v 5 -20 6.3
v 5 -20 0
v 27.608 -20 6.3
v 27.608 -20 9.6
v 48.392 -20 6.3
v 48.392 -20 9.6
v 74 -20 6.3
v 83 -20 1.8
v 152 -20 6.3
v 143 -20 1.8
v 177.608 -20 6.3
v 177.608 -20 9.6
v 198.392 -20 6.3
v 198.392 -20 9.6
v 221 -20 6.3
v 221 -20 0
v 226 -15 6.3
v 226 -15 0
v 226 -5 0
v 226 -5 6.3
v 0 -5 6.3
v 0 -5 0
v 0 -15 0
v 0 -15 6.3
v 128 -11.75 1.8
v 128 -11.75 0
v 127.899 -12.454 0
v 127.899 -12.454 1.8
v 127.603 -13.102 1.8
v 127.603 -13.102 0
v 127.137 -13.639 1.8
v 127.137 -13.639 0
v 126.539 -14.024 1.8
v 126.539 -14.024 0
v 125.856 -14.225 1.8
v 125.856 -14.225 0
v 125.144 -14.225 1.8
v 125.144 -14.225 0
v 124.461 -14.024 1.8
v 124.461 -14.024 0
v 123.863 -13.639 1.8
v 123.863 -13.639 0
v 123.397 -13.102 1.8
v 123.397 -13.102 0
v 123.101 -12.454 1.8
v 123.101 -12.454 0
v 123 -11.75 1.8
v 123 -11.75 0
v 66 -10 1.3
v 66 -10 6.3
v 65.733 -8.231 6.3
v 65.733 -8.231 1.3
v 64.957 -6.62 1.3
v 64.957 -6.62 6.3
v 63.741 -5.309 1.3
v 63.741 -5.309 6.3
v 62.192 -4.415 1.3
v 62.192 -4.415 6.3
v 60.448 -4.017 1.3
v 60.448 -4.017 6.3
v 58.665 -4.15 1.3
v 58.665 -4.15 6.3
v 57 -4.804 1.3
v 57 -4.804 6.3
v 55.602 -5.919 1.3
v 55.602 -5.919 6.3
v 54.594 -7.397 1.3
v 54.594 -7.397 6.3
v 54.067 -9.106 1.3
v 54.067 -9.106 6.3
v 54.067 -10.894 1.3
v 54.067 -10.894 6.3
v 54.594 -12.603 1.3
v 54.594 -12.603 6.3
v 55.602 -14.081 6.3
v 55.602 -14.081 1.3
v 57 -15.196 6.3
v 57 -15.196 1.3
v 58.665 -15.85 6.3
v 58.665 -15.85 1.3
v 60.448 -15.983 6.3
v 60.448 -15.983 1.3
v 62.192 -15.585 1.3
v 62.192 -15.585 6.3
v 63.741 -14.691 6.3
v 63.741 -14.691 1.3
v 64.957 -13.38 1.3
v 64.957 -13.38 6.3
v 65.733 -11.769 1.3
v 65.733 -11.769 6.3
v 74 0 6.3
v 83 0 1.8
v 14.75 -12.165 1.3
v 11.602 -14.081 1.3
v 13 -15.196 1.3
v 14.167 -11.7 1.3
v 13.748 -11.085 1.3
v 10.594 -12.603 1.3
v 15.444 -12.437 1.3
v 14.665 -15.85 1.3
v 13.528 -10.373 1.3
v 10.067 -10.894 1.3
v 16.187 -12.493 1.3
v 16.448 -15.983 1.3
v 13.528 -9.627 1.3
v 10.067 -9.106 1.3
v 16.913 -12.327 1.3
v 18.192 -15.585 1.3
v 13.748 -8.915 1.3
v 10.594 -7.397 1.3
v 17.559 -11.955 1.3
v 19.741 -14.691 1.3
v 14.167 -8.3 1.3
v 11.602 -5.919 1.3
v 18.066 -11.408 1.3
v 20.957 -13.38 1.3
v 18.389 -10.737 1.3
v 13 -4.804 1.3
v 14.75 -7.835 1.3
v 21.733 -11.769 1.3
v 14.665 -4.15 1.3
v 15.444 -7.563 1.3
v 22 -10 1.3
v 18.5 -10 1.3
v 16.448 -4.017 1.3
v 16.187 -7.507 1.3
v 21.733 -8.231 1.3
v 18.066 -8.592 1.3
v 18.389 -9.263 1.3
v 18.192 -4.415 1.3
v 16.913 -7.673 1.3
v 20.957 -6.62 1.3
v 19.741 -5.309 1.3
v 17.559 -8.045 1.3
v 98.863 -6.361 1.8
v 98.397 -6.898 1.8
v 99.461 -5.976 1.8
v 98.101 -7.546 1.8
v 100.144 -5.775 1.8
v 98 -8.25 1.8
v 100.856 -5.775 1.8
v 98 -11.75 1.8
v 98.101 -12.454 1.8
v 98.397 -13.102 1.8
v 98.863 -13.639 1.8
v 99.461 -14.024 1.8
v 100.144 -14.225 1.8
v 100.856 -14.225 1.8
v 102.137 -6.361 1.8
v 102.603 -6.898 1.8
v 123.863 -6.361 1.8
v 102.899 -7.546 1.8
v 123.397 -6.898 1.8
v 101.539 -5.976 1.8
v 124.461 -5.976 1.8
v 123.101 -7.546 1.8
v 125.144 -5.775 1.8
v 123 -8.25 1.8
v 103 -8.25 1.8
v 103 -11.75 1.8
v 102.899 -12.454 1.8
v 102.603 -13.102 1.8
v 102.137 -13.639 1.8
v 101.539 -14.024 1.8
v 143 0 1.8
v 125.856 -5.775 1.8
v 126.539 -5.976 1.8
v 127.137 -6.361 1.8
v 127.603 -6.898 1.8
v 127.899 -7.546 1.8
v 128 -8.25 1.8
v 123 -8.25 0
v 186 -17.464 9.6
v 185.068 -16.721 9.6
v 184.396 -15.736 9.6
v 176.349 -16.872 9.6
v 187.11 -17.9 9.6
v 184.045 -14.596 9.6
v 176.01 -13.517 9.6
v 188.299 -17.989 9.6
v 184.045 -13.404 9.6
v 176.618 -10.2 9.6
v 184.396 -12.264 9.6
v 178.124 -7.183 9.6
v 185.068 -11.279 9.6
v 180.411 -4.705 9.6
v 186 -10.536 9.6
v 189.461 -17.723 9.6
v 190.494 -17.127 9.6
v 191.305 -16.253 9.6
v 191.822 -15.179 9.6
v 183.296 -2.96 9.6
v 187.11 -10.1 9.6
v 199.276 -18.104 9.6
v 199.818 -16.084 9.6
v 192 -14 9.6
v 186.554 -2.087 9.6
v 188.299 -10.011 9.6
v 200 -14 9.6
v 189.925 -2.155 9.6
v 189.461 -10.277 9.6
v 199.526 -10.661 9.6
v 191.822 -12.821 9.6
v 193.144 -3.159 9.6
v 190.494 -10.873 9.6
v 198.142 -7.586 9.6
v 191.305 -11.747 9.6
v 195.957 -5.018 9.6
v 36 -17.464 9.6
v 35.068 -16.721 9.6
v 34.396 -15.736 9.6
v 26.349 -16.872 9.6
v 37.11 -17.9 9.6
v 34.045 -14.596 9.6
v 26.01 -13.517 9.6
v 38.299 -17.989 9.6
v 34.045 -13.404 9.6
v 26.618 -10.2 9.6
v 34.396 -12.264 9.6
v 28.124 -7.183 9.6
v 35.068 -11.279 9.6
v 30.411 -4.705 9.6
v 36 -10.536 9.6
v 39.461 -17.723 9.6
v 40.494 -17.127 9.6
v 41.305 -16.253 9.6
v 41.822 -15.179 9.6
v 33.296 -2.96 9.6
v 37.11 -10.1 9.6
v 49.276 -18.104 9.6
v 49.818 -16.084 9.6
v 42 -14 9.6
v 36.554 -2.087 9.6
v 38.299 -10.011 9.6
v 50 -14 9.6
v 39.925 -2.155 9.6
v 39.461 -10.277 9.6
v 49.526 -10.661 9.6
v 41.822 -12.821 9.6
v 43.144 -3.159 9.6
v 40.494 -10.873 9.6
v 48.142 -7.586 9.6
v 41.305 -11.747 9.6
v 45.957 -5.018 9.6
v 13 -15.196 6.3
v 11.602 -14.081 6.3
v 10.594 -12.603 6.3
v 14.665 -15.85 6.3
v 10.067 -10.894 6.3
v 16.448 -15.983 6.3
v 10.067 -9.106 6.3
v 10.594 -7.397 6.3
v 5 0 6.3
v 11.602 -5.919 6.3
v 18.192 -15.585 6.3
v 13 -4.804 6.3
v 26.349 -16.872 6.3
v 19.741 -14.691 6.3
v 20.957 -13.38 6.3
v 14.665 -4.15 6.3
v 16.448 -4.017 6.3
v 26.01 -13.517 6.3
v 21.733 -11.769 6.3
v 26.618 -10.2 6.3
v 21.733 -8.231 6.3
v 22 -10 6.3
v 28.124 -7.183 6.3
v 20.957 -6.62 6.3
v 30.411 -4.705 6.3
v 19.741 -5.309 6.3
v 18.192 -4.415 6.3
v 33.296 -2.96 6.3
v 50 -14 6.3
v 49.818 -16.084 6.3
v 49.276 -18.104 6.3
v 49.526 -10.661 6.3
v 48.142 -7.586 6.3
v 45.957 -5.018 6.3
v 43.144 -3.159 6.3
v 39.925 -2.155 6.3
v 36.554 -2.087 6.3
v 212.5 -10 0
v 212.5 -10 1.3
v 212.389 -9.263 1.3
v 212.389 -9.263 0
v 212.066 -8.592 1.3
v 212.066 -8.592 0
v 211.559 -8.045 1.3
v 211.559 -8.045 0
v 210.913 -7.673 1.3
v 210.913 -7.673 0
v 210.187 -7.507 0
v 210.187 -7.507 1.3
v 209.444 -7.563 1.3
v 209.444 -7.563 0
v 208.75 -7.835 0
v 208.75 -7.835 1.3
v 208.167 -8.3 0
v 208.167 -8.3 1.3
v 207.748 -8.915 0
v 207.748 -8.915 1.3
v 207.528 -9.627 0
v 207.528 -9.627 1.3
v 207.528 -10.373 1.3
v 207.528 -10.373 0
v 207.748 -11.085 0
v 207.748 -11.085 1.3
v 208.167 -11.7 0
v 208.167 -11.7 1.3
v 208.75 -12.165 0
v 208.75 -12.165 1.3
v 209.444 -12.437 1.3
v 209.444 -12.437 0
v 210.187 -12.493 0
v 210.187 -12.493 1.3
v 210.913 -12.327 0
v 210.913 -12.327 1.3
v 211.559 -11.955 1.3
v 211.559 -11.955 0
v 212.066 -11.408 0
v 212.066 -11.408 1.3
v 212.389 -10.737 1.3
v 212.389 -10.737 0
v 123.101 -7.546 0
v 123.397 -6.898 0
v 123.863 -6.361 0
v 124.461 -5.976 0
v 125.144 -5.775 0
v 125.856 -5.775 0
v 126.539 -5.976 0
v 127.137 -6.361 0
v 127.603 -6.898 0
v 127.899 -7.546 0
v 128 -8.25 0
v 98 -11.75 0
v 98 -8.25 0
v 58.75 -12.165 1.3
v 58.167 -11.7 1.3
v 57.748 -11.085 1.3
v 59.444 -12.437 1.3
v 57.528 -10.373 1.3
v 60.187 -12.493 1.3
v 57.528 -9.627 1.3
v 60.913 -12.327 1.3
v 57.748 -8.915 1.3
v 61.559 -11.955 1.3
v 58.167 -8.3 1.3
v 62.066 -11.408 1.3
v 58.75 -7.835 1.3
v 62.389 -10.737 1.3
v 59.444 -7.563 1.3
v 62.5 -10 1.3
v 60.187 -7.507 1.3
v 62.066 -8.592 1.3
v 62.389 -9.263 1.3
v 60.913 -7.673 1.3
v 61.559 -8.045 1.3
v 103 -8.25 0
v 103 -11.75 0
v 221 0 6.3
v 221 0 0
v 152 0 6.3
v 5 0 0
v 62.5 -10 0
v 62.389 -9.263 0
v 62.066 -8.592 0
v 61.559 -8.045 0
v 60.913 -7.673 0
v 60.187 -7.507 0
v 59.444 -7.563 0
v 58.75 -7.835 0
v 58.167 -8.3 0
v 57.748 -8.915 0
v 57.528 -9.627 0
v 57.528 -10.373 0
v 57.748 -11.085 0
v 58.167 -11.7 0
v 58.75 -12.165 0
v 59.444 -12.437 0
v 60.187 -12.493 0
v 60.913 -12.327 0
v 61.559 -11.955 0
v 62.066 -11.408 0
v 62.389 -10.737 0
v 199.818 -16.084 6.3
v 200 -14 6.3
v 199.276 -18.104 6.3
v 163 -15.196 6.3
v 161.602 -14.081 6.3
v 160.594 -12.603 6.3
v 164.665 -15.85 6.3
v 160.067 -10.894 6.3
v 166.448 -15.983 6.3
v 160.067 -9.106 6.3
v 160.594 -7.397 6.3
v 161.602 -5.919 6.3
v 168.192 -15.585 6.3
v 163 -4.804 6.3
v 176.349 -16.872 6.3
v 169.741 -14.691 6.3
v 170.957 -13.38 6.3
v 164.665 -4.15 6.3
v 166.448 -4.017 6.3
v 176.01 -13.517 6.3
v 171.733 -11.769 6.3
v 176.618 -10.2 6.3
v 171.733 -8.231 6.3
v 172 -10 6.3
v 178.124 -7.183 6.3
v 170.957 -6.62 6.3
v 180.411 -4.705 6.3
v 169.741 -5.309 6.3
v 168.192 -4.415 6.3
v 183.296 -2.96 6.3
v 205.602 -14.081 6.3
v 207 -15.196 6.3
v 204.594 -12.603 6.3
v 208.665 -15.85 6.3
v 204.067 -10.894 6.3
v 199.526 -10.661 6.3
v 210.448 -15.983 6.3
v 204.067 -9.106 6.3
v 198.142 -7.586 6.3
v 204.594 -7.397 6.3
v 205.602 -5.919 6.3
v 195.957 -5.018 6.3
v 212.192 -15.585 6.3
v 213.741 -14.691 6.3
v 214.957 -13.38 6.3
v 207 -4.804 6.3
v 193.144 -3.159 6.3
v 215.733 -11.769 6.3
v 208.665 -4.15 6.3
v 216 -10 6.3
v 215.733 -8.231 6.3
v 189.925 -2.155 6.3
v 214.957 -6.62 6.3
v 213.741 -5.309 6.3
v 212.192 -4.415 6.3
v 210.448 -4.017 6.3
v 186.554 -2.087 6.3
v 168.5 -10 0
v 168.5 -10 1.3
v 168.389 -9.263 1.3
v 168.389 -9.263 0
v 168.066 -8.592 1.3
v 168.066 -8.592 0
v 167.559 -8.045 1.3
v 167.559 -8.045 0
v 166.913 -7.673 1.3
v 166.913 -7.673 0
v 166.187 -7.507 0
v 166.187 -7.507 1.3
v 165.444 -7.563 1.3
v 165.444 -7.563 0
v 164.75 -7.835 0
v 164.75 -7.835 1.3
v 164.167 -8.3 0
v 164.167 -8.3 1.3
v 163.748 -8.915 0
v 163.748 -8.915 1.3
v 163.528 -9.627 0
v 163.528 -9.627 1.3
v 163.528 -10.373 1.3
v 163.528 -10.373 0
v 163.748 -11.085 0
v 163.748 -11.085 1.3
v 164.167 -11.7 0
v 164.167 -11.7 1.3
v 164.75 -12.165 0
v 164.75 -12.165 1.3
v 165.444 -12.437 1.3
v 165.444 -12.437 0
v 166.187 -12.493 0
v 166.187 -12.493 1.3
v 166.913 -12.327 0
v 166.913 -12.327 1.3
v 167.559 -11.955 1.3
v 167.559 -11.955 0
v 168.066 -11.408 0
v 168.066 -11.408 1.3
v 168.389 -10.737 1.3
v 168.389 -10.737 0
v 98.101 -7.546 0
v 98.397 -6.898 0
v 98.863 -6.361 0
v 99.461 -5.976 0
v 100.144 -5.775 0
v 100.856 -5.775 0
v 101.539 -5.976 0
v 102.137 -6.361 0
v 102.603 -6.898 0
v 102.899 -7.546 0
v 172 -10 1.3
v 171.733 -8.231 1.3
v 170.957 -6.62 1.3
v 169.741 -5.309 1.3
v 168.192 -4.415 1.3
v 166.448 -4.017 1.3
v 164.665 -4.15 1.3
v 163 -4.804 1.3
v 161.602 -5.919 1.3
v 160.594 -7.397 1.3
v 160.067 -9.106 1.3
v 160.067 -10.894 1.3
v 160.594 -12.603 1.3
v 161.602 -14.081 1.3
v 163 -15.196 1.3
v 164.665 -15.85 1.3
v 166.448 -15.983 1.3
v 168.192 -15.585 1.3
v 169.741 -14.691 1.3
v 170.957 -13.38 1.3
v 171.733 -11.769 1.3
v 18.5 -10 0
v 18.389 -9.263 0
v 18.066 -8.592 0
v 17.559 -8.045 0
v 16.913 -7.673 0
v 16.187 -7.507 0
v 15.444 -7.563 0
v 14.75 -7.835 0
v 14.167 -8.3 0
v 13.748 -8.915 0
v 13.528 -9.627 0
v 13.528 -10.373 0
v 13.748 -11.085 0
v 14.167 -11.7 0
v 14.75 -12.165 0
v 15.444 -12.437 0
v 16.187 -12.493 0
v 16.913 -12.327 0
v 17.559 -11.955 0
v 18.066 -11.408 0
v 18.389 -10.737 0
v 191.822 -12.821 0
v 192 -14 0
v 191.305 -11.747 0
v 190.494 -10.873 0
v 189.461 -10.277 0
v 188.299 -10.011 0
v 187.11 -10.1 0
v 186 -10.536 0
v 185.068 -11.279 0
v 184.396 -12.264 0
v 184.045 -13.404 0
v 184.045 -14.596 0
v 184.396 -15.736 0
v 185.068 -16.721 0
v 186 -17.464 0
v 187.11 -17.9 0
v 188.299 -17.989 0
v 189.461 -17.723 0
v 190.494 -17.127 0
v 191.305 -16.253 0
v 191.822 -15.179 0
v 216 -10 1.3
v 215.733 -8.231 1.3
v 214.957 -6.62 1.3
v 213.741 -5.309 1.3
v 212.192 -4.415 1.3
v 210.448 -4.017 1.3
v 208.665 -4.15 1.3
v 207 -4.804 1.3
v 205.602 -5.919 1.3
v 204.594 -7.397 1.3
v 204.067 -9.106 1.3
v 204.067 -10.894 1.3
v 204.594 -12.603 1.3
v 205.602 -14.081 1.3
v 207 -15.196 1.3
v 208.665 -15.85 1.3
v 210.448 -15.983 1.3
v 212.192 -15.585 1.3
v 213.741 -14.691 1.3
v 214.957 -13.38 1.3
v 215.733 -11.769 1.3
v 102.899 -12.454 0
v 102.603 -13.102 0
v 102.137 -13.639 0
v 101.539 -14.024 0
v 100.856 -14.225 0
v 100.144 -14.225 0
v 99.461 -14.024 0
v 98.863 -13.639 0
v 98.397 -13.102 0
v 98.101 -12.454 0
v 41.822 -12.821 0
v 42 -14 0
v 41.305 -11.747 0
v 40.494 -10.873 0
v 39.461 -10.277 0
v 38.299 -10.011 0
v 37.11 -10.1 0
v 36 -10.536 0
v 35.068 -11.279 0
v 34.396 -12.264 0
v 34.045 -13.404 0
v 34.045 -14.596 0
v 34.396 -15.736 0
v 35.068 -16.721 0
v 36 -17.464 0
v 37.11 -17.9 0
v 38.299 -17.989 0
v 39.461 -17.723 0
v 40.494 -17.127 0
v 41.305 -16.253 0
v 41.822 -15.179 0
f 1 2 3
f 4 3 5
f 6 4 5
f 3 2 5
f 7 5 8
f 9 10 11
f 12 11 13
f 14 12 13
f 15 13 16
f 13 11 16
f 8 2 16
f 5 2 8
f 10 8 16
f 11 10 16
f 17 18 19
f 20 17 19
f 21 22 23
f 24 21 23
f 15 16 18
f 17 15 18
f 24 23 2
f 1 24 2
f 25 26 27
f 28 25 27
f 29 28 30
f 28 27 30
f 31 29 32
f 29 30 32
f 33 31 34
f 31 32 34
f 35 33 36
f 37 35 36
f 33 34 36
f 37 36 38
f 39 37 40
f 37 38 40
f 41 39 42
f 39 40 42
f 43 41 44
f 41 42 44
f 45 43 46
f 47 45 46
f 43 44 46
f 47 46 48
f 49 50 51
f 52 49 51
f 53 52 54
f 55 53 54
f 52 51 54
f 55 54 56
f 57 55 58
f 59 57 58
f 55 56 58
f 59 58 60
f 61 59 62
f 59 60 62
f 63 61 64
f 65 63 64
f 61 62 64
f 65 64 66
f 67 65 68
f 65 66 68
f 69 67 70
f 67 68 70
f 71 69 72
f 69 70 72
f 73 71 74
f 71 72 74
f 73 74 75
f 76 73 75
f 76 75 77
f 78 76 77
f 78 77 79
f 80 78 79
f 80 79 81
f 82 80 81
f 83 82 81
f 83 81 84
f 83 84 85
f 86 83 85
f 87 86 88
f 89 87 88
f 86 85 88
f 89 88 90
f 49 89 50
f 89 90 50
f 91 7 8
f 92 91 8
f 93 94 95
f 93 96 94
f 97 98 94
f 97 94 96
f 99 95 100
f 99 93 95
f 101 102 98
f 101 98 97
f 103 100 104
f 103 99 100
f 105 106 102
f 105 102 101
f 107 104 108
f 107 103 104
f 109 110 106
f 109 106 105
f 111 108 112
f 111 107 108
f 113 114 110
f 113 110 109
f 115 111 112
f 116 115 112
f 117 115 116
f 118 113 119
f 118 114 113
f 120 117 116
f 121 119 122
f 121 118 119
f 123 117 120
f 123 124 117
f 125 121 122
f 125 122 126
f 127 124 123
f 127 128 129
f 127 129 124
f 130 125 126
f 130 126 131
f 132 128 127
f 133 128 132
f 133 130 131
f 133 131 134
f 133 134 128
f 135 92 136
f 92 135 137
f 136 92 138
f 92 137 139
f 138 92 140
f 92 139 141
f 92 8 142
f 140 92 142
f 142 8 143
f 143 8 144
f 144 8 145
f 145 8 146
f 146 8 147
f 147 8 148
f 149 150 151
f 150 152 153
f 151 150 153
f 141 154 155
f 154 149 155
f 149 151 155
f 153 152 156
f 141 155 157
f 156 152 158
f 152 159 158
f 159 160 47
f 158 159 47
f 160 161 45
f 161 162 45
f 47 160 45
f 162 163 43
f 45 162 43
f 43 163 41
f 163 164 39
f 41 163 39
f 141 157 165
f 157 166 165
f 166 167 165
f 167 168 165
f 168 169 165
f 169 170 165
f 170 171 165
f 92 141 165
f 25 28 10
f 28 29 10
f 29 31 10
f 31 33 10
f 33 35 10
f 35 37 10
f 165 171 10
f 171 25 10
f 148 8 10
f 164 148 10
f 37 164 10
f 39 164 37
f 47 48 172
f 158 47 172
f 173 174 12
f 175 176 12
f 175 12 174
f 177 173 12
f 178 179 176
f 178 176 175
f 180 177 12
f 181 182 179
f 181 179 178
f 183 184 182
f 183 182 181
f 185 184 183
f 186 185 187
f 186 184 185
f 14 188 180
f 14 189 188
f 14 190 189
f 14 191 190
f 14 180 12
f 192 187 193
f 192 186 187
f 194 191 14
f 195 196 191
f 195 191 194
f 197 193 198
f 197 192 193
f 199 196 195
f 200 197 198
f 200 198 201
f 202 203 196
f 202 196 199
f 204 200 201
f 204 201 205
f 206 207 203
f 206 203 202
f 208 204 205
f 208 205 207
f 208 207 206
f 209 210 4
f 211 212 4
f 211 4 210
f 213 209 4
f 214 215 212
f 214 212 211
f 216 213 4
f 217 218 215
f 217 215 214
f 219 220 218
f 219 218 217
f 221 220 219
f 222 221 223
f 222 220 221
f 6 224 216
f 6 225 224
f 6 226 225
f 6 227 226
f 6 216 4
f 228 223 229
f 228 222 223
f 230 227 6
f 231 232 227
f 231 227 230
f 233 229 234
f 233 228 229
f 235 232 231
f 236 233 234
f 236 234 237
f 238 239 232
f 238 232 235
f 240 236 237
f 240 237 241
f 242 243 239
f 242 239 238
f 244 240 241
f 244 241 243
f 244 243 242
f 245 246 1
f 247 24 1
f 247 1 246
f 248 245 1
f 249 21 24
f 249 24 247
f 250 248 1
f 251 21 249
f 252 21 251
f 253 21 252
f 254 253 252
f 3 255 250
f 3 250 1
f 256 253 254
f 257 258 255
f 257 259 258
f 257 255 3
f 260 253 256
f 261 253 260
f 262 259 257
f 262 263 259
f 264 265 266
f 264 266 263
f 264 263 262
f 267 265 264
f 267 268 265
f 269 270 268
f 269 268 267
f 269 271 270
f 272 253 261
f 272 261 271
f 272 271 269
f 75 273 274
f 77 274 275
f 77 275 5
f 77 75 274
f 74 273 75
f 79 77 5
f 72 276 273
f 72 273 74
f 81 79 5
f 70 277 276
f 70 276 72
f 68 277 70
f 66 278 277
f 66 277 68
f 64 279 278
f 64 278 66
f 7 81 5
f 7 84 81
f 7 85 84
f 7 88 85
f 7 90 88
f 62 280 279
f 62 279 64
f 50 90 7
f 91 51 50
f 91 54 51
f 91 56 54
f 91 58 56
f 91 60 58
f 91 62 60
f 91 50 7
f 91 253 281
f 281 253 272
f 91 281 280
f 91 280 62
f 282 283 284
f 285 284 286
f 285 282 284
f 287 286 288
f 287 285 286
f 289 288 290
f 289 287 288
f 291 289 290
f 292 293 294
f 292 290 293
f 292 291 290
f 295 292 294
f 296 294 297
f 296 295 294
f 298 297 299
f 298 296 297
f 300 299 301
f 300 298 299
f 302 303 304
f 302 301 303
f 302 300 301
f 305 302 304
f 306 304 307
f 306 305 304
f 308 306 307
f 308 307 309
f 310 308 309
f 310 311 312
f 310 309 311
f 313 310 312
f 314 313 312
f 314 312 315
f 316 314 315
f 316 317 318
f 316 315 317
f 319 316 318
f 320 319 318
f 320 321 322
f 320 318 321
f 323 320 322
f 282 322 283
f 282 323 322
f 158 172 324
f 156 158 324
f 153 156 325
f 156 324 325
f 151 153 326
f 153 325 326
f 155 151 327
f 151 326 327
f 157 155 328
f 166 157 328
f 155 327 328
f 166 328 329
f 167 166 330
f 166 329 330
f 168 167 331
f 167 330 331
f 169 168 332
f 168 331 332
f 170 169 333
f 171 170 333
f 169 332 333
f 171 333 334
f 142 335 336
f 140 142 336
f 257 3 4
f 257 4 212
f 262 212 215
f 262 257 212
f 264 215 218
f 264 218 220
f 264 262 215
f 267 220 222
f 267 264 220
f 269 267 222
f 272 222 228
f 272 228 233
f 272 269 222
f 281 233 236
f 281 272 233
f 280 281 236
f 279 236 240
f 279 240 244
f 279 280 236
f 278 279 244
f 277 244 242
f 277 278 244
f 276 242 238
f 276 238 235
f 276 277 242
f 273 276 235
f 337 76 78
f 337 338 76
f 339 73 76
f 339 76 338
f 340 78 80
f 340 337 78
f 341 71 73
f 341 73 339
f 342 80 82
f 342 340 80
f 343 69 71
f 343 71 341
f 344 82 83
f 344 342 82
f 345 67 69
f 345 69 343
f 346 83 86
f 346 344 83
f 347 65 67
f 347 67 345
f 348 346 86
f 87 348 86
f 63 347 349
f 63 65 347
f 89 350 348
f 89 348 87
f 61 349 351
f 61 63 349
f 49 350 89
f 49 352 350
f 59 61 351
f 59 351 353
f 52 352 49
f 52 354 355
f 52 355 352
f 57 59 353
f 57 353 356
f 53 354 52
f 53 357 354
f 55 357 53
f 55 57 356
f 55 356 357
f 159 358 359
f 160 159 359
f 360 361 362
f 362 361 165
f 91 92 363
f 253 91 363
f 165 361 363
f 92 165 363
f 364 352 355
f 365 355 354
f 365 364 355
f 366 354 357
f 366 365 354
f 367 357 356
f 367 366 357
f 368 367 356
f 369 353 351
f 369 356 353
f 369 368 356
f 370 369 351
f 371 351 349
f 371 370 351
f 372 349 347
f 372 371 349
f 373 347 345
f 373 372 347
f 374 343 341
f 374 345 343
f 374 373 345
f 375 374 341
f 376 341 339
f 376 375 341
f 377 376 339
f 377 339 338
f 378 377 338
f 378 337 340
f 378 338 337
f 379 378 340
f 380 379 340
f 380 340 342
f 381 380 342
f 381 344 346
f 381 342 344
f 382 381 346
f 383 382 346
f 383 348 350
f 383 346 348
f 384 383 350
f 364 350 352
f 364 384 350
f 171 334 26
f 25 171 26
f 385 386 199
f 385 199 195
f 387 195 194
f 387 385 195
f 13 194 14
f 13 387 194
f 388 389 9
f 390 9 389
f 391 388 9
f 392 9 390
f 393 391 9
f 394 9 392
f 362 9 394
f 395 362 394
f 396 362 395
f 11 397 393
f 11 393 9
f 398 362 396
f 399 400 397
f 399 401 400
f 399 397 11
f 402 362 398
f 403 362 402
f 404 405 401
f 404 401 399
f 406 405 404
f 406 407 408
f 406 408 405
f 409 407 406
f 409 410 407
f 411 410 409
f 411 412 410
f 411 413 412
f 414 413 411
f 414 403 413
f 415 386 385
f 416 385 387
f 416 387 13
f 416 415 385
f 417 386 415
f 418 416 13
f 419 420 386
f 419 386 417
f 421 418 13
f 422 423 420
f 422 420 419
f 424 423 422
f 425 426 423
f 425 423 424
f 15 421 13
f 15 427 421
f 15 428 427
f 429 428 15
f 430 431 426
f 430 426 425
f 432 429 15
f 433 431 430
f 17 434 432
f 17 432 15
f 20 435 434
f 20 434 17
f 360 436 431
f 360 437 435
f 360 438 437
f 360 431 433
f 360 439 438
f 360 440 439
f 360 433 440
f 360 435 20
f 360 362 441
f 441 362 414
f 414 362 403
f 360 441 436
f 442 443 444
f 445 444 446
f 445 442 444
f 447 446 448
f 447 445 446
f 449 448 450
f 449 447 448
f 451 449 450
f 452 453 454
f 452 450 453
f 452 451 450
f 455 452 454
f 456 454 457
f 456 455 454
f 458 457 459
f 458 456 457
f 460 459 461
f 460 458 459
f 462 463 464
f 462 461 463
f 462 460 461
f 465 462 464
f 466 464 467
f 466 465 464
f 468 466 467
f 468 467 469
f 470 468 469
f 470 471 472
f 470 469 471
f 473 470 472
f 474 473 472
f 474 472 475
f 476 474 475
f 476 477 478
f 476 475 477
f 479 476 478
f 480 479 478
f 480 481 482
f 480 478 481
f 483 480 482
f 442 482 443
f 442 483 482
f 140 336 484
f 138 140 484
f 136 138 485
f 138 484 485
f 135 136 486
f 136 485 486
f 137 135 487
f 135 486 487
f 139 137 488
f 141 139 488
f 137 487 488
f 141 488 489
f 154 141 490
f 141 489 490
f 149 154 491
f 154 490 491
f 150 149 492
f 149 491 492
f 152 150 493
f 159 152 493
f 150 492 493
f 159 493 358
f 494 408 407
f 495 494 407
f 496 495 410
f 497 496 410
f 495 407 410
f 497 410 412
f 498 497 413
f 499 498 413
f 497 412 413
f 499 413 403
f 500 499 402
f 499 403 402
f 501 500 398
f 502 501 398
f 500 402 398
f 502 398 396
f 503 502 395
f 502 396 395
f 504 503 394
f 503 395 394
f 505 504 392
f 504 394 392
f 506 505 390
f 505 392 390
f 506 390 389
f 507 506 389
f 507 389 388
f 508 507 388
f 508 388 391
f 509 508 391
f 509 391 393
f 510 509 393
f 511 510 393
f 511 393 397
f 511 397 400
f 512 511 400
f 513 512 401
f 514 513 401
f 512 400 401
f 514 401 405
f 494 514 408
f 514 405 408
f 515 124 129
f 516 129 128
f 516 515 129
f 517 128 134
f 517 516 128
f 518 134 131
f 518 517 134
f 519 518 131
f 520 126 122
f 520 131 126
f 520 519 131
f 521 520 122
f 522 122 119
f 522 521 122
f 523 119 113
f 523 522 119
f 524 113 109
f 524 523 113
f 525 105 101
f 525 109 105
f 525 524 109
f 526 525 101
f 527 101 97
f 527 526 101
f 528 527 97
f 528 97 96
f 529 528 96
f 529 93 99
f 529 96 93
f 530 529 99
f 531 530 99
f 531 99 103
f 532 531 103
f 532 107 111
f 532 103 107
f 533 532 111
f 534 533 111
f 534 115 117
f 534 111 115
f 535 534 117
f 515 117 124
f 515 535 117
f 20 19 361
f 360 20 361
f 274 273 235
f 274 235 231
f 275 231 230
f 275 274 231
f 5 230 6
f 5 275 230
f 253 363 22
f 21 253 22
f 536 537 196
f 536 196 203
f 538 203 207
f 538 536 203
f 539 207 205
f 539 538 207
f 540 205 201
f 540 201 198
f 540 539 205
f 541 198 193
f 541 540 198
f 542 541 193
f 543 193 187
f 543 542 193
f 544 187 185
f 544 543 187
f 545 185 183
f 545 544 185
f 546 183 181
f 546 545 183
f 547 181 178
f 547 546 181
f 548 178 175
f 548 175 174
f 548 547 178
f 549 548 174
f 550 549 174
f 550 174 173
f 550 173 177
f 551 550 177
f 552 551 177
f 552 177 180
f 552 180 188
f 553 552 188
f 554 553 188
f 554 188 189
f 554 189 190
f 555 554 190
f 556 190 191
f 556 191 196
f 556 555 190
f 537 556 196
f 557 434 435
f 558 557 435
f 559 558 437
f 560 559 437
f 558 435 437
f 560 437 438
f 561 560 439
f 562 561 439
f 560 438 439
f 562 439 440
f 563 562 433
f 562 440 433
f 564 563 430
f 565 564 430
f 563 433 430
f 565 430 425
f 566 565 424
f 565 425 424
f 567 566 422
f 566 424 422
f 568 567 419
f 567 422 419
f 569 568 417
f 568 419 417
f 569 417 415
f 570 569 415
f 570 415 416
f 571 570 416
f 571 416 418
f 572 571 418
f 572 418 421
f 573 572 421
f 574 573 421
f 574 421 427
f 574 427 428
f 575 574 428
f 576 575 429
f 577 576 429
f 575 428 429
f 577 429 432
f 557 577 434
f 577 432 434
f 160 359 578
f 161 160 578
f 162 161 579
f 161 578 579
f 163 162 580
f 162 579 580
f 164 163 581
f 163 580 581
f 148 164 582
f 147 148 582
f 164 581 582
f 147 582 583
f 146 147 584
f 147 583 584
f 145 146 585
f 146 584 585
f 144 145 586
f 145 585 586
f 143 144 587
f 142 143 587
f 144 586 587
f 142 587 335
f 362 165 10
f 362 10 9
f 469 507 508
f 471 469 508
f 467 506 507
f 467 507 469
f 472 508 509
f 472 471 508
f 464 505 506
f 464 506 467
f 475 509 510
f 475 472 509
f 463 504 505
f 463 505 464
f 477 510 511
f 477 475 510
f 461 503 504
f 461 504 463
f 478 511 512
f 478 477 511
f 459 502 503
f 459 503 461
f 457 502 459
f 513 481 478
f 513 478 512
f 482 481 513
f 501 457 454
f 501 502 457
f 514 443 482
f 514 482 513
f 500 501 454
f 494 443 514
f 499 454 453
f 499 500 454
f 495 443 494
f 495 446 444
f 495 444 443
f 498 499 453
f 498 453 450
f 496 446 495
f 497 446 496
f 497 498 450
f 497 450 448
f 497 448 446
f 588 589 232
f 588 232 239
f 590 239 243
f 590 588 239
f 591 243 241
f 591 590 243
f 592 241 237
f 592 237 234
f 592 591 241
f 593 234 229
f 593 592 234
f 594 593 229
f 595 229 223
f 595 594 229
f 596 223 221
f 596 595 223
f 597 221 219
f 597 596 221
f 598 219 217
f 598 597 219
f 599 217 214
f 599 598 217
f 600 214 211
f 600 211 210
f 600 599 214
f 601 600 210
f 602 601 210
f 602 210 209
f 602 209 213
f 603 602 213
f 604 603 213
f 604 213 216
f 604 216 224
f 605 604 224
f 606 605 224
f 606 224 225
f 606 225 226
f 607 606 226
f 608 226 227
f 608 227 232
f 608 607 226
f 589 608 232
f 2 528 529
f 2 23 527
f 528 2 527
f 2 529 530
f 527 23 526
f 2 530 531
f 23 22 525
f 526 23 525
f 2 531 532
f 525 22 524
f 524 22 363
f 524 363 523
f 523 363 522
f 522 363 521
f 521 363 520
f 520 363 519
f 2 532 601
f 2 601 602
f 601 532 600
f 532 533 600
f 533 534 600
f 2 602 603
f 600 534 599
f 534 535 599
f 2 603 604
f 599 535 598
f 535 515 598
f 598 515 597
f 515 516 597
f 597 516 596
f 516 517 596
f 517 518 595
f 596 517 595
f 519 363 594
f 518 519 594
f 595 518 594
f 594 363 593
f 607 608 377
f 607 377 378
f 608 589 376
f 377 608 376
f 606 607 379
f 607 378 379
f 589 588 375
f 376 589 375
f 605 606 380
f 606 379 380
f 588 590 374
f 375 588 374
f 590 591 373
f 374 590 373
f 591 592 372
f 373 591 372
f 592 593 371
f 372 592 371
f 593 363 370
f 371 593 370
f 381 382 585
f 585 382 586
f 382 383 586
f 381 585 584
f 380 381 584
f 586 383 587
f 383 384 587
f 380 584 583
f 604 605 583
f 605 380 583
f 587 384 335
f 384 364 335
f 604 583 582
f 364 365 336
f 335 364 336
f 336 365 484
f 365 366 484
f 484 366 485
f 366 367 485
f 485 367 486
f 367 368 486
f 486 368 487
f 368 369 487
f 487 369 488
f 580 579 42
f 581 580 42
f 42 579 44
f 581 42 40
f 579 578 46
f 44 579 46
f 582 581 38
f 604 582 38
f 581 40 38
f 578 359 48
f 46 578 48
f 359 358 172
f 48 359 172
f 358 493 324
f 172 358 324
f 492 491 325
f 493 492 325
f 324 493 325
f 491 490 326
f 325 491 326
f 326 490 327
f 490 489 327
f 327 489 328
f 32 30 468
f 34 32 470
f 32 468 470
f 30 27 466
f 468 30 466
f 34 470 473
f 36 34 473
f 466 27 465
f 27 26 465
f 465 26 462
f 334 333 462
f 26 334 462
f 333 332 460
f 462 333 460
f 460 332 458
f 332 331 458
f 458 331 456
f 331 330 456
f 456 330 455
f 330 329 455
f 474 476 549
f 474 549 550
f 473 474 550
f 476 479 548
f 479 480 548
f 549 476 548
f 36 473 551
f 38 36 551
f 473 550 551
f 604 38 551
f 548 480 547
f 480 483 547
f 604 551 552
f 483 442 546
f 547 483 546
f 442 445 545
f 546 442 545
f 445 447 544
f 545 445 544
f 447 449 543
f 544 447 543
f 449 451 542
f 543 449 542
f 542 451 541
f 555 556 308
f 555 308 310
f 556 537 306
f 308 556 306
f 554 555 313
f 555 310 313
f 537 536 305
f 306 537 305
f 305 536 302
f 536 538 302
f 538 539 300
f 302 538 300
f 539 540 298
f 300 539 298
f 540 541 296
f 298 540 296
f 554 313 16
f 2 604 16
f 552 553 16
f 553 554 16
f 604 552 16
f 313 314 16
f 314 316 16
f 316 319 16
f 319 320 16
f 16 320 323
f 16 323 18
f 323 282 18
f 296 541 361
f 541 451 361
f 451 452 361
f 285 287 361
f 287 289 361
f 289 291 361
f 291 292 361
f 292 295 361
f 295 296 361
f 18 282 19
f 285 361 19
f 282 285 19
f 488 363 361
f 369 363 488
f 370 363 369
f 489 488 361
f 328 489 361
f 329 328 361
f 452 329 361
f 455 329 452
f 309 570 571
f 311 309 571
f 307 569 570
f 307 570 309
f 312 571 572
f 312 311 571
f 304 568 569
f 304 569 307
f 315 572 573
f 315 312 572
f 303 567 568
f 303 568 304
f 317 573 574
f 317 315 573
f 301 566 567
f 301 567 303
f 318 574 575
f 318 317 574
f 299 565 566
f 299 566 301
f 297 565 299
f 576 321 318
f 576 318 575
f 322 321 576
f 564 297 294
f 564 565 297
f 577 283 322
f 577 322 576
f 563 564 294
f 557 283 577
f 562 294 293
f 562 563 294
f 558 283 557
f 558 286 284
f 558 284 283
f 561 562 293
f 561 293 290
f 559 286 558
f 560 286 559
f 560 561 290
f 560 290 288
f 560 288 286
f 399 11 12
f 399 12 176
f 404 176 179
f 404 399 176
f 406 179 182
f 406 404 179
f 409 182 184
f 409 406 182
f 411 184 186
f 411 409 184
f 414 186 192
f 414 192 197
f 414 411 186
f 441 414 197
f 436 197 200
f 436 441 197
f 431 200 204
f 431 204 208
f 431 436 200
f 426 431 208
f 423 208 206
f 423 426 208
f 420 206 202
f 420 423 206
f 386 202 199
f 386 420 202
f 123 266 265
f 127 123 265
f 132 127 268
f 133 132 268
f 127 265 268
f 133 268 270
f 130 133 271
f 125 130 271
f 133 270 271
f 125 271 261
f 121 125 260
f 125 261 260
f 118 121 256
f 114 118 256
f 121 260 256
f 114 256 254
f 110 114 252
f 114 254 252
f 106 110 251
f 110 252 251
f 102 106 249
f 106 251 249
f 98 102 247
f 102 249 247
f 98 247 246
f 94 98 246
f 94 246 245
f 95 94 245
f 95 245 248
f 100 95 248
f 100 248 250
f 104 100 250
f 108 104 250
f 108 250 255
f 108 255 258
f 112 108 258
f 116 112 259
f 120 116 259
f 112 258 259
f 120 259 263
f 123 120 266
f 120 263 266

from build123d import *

# Parameters (mm, degrees)
SKETCH1_R           = 4
SKETCH1_R_2         = 2.5
BOSS_EXTRUDE1_DEPTH = 9.6
CUT_EXTRUDE1_START  = -3.3
SKETCH2_R           = 2.5
CUT_EXTRUDE1_DEPTH  = 3.3
CUT_EXTRUDE2_DEPTH  = 228.086239125
SKETCH5_R           = 6
CUT_EXTRUDE3_DEPTH  = 5


with BuildPart() as part:
    # Sketch1 → Boss-Extrude1 (new body)
    with BuildSketch(Plane.XY):
        Polygon((221, 0), (5, 0), (0, -5), (0, -15), (5, -20), (221, -20), (226, -15), (226, -5), align=None)
        with Locations((38, -14)):
            Circle(SKETCH1_R, mode=Mode.SUBTRACT)
        with Locations((188, -14)):
            Circle(SKETCH1_R, mode=Mode.SUBTRACT)
        with Locations((16, -10)):
            Circle(SKETCH1_R_2, mode=Mode.SUBTRACT)
        with Locations((60, -10)):
            Circle(SKETCH1_R_2, mode=Mode.SUBTRACT)
        with BuildLine():
            ThreePointArc((98, -8.25), (100.5, -5.75), (103, -8.25))
            Line((103, -8.25), (103, -11.75))
            ThreePointArc((103, -11.75), (100.5, -14.25), (98, -11.75))
            Line((98, -11.75), (98, -8.25))
        make_face(mode=Mode.SUBTRACT)
        with BuildLine():
            Line((128, -8.25), (128, -11.75))
            ThreePointArc((128, -11.75), (125.5, -14.25), (123, -11.75))
            Line((123, -11.75), (123, -8.25))
            ThreePointArc((123, -8.25), (125.5, -5.75), (128, -8.25))
        make_face(mode=Mode.SUBTRACT)
        with Locations((166, -10)):
            Circle(SKETCH1_R_2, mode=Mode.SUBTRACT)
        with Locations((210, -10)):
            Circle(SKETCH1_R_2, mode=Mode.SUBTRACT)
    extrude(amount=BOSS_EXTRUDE1_DEPTH)

    # Sketch2 → Cut-Extrude1 (cut)
    # profile 1 of 2: a face of its own
    with BuildSketch(Plane.XY.offset(9.6).offset(CUT_EXTRUDE1_START)):
        with BuildLine():
            Line((48.392304845, -20), (113, -20))
            Line((113, -20), (113, 0))
            Line((113, 0), (5, 0))
            Line((5, 0), (0, -5))
            Line((0, -5), (0, -15))
            Line((0, -15), (5, -20))
            Line((5, -20), (27.607695155, -20))
            ThreePointArc((27.607695155, -20), (34.894171459, -2.408890085), (50, -14))
            ThreePointArc((50, -14), (49.591109915, -17.105828541), (48.392304845, -20))
        make_face()
        with Locations((16, -10)):
            Circle(SKETCH2_R, mode=Mode.SUBTRACT)
        with Locations((60, -10)):
            Circle(SKETCH2_R, mode=Mode.SUBTRACT)
        with BuildLine():
            Line((98, -11.75), (98, -8.25))
            ThreePointArc((98, -8.25), (100.5, -5.75), (103, -8.25))
            Line((103, -8.25), (103, -11.75))
            ThreePointArc((103, -11.75), (100.5, -14.25), (98, -11.75))
        make_face(mode=Mode.SUBTRACT)
    # profile 2 of 2: a face of its own
    with BuildSketch(Plane.XY.offset(9.6).offset(CUT_EXTRUDE1_START)):
        with BuildLine():
            Line((113, 0), (113, -20))
            Line((113, -20), (177.607695155, -20))
            ThreePointArc((177.607695155, -20), (184.894171459, -2.408890085), (200, -14))
            ThreePointArc((200, -14), (199.591109915, -17.105828541), (198.392304845, -20))
            Line((198.392304845, -20), (221, -20))
            Line((221, -20), (226, -15))
            Line((226, -15), (226, -5))
            Line((226, -5), (221, 0))
            Line((221, 0), (113, 0))
        make_face()
        with BuildLine():
            Line((123, -11.75), (123, -8.25))
            ThreePointArc((123, -8.25), (125.5, -5.75), (128, -8.25))
            Line((128, -8.25), (128, -11.75))
            ThreePointArc((128, -11.75), (125.5, -14.25), (123, -11.75))
        make_face(mode=Mode.SUBTRACT)
        with Locations((166, -10)):
            Circle(SKETCH2_R, mode=Mode.SUBTRACT)
        with Locations((210, -10)):
            Circle(SKETCH2_R, mode=Mode.SUBTRACT)
    extrude(amount=CUT_EXTRUDE1_DEPTH, mode=Mode.SUBTRACT)

    # Sketch4 → Cut-Extrude2 (cut, through all)
    with BuildSketch(Plane.XZ.offset(20)):
        Polygon((143, 1.8), (152, 6.3), (113, 6.3), (74, 6.3), (83, 1.8), align=None)
    extrude(amount=-CUT_EXTRUDE2_DEPTH, mode=Mode.SUBTRACT)

    # Sketch5 → Cut-Extrude3 (cut)
    with BuildSketch(Plane.XY.offset(6.3)):
        with Locations((16, -10)):
            Circle(SKETCH5_R)
        with Locations((60, -10)):
            Circle(SKETCH5_R)
        with Locations((166, -10)):
            Circle(SKETCH5_R)
        with Locations((210, -10)):
            Circle(SKETCH5_R)
    extrude(amount=-CUT_EXTRUDE3_DEPTH, mode=Mode.SUBTRACT)


solid = part.part
